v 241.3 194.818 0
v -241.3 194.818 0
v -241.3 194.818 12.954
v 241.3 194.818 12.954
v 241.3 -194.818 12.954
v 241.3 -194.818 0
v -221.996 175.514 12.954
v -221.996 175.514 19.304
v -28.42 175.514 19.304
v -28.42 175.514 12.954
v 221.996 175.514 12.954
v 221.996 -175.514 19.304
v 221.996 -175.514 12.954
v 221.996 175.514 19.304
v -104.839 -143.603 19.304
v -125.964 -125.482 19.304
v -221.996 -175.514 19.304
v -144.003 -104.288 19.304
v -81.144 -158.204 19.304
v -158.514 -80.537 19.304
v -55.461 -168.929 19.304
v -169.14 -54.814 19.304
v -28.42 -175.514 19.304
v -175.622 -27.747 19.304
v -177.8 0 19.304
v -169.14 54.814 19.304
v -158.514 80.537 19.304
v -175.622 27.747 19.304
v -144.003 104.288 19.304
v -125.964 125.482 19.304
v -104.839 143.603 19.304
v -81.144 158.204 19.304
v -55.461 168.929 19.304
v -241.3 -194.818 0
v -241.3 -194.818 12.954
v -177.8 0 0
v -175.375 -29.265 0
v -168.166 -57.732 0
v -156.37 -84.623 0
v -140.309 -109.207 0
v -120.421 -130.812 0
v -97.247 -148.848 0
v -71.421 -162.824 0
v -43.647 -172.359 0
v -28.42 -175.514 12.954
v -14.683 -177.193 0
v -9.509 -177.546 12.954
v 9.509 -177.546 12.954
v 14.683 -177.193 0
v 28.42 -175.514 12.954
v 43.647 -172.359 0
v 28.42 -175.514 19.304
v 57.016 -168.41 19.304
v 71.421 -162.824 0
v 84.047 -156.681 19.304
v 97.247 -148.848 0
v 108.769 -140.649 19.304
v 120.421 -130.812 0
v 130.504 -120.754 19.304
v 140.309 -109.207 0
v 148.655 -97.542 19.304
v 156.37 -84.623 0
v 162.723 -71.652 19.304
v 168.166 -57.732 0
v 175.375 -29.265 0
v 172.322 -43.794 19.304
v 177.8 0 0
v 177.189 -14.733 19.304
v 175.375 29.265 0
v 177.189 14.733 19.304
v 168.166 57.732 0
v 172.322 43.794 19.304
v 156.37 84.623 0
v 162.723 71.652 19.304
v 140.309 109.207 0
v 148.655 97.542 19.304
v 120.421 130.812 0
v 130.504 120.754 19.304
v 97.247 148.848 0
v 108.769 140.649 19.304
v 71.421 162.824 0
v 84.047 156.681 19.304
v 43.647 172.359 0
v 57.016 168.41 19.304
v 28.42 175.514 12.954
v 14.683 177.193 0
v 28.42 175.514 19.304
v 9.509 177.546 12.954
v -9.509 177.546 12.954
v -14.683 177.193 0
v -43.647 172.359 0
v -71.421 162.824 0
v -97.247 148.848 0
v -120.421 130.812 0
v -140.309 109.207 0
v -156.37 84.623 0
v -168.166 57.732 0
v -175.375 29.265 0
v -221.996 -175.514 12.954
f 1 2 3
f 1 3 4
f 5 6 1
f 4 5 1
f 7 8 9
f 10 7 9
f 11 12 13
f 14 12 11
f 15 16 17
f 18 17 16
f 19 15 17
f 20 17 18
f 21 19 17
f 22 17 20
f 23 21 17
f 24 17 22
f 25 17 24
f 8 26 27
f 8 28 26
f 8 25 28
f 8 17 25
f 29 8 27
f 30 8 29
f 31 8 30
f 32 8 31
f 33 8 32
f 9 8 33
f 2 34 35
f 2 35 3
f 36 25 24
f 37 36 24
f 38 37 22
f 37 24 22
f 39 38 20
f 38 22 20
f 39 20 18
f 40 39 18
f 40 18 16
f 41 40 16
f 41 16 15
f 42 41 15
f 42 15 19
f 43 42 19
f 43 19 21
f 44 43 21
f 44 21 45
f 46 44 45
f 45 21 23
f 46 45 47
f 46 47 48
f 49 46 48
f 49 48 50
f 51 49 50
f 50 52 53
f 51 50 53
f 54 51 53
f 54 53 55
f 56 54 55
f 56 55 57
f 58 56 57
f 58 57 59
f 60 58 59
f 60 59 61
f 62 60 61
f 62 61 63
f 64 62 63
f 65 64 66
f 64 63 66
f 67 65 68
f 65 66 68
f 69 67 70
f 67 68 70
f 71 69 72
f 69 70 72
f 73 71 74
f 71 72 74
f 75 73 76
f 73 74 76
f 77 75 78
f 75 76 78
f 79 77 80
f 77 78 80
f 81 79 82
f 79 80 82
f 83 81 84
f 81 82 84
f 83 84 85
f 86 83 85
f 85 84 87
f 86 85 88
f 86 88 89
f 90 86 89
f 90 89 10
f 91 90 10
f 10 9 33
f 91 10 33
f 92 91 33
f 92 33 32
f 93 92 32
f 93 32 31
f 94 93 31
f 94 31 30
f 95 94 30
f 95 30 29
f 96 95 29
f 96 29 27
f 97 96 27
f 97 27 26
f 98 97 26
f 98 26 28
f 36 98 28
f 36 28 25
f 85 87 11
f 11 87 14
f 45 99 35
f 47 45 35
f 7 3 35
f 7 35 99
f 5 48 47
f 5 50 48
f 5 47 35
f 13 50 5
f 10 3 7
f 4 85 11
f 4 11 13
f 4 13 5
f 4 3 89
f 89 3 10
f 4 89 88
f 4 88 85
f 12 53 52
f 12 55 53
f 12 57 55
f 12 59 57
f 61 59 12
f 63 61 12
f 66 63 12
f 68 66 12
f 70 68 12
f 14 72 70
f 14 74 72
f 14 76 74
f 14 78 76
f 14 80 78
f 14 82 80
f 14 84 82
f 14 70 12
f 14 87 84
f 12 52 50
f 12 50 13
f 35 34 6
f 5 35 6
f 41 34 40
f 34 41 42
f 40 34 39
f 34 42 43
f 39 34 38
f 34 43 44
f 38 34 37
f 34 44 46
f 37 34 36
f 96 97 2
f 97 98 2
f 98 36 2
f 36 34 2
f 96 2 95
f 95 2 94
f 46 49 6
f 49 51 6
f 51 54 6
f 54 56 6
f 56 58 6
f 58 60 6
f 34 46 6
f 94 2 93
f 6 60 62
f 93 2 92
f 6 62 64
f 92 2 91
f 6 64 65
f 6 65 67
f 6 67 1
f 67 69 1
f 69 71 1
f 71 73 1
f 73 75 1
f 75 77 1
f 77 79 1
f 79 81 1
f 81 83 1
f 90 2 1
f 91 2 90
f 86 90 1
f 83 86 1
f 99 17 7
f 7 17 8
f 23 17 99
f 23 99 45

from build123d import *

# Parameters (mm, degrees)
F0_W     = 482.6
F0_H     = 389.636
F1_DEPTH = 19.304
F2_D     = 355.6
F3_W     = 19.304
F3_H     = 19.304
F3_W_2   = 443.992
F3_H_2   = 351.028
F4_DEPTH = 6.35


with BuildPart() as f1:
    # F0 (on Top) → F1 (new body)
    with BuildSketch(Plane.XY):
        Rectangle(F0_W, F0_H)
    extrude(amount=F1_DEPTH)

    # F2 (through all)
    with Locations(Plane(origin=(0, 0, 0), x_dir=(1, 0, 0), z_dir=(0, 0, -1))):
        with Locations((0, 0)):
            Hole(F2_D / 2)

    # F3 (on face) → F4 (cut)
    with BuildSketch(Plane.XY.offset(19.304)):
        with Locations((-231.648, 185.166)):
            Rectangle(F3_W, F3_H)
        with Locations((0, 185.166)):
            Rectangle(F3_W_2, F3_H)
        with Locations((-231.648, 0)):
            Rectangle(F3_W, F3_H_2)
        with Locations((231.648, 185.166)):
            Rectangle(F3_W, F3_H)
        with Locations((-231.648, -185.166)):
            Rectangle(F3_W, F3_H)
        with Locations((231.648, 0)):
            Rectangle(F3_W, F3_H_2)
        with Locations((0, -185.166)):
            Rectangle(F3_W_2, F3_H)
        with Locations((231.648, -185.166)):
            Rectangle(F3_W, F3_H)
    extrude(amount=-F4_DEPTH, mode=Mode.SUBTRACT)


solid = f1.part
